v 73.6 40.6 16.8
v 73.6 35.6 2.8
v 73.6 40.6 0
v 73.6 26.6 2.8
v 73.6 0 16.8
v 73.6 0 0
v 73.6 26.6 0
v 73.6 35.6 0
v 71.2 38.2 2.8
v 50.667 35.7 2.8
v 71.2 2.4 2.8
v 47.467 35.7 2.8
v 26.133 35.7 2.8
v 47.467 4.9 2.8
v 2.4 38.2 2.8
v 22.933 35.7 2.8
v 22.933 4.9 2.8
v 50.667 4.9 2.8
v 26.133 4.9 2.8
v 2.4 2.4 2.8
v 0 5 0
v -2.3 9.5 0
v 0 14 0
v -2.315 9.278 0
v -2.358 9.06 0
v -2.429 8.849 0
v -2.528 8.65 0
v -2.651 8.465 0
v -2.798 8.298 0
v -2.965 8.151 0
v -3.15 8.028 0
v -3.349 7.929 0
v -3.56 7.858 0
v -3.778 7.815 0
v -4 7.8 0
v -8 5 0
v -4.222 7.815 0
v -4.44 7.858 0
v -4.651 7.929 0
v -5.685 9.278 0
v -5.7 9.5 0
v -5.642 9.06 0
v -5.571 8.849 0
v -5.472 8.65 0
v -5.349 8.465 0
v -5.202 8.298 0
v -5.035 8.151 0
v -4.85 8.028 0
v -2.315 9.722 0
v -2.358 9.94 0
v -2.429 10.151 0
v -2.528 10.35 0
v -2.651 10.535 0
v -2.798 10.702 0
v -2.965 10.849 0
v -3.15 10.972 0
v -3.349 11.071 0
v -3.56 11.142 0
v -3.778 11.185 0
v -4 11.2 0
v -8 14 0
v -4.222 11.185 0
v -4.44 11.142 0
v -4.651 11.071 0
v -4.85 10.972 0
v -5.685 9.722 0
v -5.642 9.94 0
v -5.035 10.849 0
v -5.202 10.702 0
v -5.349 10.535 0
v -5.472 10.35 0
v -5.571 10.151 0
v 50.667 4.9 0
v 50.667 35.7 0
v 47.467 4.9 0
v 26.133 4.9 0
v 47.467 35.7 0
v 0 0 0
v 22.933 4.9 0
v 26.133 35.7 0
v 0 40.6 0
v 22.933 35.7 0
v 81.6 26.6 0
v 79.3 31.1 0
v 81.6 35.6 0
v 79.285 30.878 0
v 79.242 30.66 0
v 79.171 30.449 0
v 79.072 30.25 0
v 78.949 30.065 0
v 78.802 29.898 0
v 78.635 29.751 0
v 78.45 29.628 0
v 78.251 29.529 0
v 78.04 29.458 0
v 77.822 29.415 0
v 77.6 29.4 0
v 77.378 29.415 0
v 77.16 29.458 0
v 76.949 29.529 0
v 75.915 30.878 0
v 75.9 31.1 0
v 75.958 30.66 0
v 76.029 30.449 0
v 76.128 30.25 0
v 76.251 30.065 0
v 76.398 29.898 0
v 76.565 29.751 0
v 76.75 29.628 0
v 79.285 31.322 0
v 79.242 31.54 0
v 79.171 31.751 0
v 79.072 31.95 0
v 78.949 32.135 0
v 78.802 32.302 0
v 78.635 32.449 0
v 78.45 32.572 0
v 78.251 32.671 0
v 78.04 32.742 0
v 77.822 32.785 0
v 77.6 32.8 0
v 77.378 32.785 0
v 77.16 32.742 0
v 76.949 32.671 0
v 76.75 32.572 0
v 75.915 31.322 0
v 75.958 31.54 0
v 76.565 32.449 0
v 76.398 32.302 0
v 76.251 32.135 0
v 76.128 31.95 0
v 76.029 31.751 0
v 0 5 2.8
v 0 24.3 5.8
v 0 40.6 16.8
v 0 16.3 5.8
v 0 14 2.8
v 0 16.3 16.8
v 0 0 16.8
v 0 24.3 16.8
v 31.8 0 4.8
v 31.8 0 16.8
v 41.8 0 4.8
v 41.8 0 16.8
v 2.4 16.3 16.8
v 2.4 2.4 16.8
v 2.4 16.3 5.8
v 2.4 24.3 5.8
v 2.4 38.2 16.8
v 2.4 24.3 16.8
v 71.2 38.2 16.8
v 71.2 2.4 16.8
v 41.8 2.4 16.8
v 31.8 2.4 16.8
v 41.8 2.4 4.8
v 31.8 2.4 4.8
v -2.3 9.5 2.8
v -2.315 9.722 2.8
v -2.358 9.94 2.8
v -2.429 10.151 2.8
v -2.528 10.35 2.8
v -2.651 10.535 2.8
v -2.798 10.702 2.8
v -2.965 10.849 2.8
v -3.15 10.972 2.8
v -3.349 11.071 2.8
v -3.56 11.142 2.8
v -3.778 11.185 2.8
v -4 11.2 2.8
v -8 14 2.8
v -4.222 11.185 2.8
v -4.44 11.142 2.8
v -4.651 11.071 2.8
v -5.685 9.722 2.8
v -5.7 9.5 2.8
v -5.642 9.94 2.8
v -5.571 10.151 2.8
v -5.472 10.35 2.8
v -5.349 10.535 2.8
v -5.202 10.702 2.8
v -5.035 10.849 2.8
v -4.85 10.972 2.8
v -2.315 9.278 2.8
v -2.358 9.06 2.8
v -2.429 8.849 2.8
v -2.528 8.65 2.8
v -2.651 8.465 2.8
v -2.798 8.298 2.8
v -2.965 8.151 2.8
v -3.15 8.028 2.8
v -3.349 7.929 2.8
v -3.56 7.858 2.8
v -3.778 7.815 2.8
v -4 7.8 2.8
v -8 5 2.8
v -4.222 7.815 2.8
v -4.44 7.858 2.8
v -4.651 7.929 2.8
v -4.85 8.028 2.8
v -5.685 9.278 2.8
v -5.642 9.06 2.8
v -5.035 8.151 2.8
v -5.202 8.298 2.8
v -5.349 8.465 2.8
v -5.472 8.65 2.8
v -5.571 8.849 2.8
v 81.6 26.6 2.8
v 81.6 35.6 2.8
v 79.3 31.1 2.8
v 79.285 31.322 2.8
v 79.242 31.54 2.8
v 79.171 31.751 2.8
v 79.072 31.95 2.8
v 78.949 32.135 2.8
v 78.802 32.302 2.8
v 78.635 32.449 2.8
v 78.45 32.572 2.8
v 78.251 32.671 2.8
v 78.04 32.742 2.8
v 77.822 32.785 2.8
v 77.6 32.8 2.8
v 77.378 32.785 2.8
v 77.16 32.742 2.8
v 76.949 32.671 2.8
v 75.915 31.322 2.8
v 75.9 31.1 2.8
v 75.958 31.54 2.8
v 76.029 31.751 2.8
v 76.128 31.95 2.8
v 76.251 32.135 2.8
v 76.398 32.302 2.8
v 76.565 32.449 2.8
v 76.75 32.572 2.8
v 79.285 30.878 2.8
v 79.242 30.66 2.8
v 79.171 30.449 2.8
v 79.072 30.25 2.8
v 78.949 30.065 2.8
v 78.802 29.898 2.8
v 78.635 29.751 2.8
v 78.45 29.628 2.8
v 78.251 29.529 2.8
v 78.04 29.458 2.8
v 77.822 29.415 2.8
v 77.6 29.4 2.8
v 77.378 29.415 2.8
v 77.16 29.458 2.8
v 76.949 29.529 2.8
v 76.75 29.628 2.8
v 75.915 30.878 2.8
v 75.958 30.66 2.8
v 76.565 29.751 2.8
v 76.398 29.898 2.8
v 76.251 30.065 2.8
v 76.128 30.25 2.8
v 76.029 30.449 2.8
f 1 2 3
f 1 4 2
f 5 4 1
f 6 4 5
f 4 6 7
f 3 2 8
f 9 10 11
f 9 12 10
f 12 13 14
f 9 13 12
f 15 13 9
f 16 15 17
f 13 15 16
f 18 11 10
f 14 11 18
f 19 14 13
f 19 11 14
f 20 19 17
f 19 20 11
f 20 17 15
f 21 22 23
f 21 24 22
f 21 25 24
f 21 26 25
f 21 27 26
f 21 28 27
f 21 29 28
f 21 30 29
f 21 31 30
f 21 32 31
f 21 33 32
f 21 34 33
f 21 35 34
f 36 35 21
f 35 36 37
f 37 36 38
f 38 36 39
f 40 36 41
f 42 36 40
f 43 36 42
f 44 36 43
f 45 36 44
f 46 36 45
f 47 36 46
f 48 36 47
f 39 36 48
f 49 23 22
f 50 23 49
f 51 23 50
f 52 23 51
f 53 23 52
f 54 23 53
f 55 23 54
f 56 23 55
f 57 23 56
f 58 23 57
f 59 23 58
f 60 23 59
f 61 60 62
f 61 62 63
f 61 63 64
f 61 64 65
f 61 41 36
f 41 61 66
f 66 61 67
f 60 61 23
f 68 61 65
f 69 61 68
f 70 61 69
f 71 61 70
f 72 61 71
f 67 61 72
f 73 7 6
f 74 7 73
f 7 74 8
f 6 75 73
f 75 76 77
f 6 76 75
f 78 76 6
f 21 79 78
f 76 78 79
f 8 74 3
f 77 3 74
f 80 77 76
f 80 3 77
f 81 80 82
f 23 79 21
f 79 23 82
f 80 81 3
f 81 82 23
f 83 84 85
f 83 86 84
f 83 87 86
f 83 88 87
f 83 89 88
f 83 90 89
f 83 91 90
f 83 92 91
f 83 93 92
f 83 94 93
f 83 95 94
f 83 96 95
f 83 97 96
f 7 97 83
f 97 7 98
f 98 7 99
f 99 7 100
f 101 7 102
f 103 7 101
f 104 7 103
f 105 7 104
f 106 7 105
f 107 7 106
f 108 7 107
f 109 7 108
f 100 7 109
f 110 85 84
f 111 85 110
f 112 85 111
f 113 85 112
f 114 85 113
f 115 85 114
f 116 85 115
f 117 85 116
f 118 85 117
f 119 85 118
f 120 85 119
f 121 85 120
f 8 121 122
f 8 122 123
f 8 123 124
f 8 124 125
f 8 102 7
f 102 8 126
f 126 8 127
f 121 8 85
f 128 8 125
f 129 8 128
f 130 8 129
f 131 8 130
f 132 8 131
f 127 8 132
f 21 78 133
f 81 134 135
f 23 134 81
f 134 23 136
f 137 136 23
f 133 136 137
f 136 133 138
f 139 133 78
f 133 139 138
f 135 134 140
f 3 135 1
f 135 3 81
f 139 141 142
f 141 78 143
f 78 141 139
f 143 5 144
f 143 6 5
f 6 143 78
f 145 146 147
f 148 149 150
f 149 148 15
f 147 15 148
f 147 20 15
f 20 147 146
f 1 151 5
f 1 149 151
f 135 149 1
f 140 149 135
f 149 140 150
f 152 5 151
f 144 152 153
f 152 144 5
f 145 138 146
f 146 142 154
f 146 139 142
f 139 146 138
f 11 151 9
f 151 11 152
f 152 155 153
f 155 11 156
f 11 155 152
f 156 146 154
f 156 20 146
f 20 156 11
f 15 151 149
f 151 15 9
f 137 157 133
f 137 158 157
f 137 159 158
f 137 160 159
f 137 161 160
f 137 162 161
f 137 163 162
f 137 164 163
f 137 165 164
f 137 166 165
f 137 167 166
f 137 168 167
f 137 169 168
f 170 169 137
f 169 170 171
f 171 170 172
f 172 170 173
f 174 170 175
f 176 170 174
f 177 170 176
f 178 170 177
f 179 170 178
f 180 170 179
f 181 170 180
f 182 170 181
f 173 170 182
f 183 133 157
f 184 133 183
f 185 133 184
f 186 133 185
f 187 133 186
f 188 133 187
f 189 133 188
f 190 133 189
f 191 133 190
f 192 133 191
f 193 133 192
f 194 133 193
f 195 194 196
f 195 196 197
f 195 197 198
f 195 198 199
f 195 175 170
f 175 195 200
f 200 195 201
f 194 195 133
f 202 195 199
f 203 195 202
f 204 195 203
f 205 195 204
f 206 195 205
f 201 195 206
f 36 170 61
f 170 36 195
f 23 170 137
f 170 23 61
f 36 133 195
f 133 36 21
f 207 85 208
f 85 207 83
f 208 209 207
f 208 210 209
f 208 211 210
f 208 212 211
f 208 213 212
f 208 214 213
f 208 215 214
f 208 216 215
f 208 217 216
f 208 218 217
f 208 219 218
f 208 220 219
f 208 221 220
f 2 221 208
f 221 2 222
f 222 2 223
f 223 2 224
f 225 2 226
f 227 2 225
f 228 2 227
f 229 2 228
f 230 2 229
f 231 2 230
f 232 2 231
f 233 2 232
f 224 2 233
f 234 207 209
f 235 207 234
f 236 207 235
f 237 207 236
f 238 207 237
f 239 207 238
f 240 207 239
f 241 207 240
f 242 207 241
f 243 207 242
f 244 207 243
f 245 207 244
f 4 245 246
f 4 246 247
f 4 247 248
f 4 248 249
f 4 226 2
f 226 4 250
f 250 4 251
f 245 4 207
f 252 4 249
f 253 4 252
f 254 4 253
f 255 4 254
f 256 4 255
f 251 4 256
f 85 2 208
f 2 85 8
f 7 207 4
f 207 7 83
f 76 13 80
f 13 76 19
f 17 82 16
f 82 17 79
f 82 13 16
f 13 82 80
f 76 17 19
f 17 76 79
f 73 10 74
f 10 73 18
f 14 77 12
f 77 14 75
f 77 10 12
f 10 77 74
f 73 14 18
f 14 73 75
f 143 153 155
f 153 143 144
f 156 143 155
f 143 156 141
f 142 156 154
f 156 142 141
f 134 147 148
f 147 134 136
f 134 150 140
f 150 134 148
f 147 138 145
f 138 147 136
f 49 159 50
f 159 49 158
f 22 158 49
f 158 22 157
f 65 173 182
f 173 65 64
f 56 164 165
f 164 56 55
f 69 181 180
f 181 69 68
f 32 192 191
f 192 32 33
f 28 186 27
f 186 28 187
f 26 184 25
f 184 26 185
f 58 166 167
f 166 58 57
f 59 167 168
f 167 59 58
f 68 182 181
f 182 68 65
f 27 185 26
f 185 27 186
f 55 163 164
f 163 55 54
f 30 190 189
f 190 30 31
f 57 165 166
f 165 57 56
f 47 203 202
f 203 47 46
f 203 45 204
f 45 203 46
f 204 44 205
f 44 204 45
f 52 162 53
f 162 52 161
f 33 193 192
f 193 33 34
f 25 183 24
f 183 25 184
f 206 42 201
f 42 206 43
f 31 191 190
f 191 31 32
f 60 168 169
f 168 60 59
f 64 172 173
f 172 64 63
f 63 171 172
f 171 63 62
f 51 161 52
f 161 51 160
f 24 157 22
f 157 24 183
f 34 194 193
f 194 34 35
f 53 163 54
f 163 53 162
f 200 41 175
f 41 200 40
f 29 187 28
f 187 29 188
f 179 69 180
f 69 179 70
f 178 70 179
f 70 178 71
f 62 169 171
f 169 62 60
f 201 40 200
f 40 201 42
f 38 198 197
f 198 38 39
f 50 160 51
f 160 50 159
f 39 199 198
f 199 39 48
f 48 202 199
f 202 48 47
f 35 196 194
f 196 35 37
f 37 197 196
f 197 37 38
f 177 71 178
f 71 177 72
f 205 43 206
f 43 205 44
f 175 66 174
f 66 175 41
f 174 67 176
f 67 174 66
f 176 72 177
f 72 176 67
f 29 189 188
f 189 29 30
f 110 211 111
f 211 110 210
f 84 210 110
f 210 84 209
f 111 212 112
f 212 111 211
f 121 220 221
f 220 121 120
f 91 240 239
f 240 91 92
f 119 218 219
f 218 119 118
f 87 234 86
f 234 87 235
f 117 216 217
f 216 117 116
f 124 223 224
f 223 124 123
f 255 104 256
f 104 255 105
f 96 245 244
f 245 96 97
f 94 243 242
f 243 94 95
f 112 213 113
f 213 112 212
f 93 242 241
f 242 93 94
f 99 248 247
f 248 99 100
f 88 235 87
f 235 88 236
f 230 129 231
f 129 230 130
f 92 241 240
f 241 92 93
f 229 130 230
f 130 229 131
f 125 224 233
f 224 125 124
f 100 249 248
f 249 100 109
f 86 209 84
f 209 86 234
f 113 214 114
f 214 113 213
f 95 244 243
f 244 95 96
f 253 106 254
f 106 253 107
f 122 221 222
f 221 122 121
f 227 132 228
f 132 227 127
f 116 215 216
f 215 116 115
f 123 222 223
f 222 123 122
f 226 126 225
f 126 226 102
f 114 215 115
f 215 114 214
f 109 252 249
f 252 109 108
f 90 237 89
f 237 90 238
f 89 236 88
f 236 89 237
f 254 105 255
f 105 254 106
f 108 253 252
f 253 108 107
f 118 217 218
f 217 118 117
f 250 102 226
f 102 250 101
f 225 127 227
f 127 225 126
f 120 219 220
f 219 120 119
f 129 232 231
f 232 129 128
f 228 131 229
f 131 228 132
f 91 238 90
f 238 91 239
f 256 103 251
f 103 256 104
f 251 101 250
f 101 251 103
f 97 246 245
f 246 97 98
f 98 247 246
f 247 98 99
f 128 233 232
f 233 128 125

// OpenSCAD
// Desk robot remaining mechanical FIT TESTS. Units mm, original CC0 source.
// Not a finished chassis or an energized dock. Set actual measured parts.
$fn = 48;
part = "battery_boost_tray";
fit_xy = 0.4;
m3_clearance = 3.4;

// Battery/boost system package envelope. MEASURE after selecting rated boards.
power_l = 68;
power_w = 35;
power_h = 14;
wall = 2.4;
base = 2.8;
tray_strap_slot_w = 3.2;

// Dummy charging connector sizes only. Keep these printed parts NONCONDUCTIVE.
contact_centers_mm = 20;
contact_outer_d_mm = 4;
contact_pocket_depth_mm = 5;
contact_carrier_l = 54;
contact_carrier_w = 25;
contact_carrier_h = 9;

// Actual test reference thickness. Prints a replaceable jaw calibration coupon.
jaw_reference_thickness_mm = 2;
jaw_reference_width_mm = 12;
jaw_reference_depth_mm = 12;

module battery_boost_tray() {
    l = power_l + 2*fit_xy + 2*wall;
    w = power_w + 2*fit_xy + 2*wall;
    h = power_h + base;
    assert(power_l > 25 && power_l < 150);
    assert(power_w > 12 && power_w < 100);
    assert(power_h > 4 && power_h < 60);
    difference() {
        union() {
            cube([l, w, base]);
            cube([wall, w, h]);
            translate([l-wall,0,0]) cube([wall, w, h]);
            cube([l, wall, h]);
            translate([0,w-wall,0]) cube([l, wall, h]);
            // External mounting tabs, not battery screw holes.
            translate([-8, 5, 0]) cube([8, 9, base]);
            translate([l, w-14, 0]) cube([8, 9, base]);
        }
        // Lift-out / cable slots in the rear and side walls.
        translate([l/2-5,-1,base+2]) cube([10,wall+2, h]);
        translate([-1,w/2-4,base+3]) cube([wall+2,8,h]);
        translate([-4,9.5,base/2]) cylinder(h=base+1,d=m3_clearance,center=true);
        translate([l+4,w-9.5,base/2]) cylinder(h=base+1,d=m3_clearance,center=true);
        // Two accessible strap openings through the base.
        for(x=[l/3,2*l/3])
            translate([x,w/2,base/2])
                cube([tray_strap_slot_w,w-2*wall-5,base+1],center=true);
    }
}

module dock_contact_recess_gauge() {
    assert(contact_centers_mm > 8 && contact_centers_mm < contact_carrier_l-14);
    assert(contact_outer_d_mm > 1 && contact_outer_d_mm < 10);
    assert(contact_pocket_depth_mm > 1 && contact_pocket_depth_mm < contact_carrier_h);
    difference() {
        translate([-contact_carrier_l/2,-contact_carrier_w/2,0])
            cube([contact_carrier_l, contact_carrier_w, contact_carrier_h]);
        // Recessed NONENERGIZED connector fit pockets. No contact polarity.
        for(x=[-contact_centers_mm/2, contact_centers_mm/2])
            translate([x,0,contact_carrier_h-contact_pocket_depth_mm])
                cylinder(h=contact_pocket_depth_mm+1,d=contact_outer_d_mm+fit_xy);
        for(x=[-contact_carrier_l/2+5,contact_carrier_l/2-5])
            translate([x,0,contact_carrier_h/2])
                cylinder(h=contact_carrier_h+1,d=m3_clearance,center=true);
        // Sample cable clearance only; do not power any contacts with this part.
        translate([-3,contact_carrier_w/2-3,0]) cube([6,4,3]);
    }
}

module jaw_calibration_coupon() {
    assert(jaw_reference_thickness_mm >= 0.8 && jaw_reference_thickness_mm <= 15);
    assert(jaw_reference_width_mm >= 6 && jaw_reference_depth_mm >= 6);
    // Print flat, put it between the unpowered jaws, then measure actual
    // servo angle + tactile ADC response before applying any force limits.
    cube([jaw_reference_width_mm,jaw_reference_depth_mm,
          jaw_reference_thickness_mm]);
}

if(part == "battery_boost_tray") battery_boost_tray();
else if(part == "dock_contact_recess_gauge") dock_contact_recess_gauge();
else if(part == "jaw_calibration_coupon") jaw_calibration_coupon();
else assert(false,"Unknown printable fit gauge");
